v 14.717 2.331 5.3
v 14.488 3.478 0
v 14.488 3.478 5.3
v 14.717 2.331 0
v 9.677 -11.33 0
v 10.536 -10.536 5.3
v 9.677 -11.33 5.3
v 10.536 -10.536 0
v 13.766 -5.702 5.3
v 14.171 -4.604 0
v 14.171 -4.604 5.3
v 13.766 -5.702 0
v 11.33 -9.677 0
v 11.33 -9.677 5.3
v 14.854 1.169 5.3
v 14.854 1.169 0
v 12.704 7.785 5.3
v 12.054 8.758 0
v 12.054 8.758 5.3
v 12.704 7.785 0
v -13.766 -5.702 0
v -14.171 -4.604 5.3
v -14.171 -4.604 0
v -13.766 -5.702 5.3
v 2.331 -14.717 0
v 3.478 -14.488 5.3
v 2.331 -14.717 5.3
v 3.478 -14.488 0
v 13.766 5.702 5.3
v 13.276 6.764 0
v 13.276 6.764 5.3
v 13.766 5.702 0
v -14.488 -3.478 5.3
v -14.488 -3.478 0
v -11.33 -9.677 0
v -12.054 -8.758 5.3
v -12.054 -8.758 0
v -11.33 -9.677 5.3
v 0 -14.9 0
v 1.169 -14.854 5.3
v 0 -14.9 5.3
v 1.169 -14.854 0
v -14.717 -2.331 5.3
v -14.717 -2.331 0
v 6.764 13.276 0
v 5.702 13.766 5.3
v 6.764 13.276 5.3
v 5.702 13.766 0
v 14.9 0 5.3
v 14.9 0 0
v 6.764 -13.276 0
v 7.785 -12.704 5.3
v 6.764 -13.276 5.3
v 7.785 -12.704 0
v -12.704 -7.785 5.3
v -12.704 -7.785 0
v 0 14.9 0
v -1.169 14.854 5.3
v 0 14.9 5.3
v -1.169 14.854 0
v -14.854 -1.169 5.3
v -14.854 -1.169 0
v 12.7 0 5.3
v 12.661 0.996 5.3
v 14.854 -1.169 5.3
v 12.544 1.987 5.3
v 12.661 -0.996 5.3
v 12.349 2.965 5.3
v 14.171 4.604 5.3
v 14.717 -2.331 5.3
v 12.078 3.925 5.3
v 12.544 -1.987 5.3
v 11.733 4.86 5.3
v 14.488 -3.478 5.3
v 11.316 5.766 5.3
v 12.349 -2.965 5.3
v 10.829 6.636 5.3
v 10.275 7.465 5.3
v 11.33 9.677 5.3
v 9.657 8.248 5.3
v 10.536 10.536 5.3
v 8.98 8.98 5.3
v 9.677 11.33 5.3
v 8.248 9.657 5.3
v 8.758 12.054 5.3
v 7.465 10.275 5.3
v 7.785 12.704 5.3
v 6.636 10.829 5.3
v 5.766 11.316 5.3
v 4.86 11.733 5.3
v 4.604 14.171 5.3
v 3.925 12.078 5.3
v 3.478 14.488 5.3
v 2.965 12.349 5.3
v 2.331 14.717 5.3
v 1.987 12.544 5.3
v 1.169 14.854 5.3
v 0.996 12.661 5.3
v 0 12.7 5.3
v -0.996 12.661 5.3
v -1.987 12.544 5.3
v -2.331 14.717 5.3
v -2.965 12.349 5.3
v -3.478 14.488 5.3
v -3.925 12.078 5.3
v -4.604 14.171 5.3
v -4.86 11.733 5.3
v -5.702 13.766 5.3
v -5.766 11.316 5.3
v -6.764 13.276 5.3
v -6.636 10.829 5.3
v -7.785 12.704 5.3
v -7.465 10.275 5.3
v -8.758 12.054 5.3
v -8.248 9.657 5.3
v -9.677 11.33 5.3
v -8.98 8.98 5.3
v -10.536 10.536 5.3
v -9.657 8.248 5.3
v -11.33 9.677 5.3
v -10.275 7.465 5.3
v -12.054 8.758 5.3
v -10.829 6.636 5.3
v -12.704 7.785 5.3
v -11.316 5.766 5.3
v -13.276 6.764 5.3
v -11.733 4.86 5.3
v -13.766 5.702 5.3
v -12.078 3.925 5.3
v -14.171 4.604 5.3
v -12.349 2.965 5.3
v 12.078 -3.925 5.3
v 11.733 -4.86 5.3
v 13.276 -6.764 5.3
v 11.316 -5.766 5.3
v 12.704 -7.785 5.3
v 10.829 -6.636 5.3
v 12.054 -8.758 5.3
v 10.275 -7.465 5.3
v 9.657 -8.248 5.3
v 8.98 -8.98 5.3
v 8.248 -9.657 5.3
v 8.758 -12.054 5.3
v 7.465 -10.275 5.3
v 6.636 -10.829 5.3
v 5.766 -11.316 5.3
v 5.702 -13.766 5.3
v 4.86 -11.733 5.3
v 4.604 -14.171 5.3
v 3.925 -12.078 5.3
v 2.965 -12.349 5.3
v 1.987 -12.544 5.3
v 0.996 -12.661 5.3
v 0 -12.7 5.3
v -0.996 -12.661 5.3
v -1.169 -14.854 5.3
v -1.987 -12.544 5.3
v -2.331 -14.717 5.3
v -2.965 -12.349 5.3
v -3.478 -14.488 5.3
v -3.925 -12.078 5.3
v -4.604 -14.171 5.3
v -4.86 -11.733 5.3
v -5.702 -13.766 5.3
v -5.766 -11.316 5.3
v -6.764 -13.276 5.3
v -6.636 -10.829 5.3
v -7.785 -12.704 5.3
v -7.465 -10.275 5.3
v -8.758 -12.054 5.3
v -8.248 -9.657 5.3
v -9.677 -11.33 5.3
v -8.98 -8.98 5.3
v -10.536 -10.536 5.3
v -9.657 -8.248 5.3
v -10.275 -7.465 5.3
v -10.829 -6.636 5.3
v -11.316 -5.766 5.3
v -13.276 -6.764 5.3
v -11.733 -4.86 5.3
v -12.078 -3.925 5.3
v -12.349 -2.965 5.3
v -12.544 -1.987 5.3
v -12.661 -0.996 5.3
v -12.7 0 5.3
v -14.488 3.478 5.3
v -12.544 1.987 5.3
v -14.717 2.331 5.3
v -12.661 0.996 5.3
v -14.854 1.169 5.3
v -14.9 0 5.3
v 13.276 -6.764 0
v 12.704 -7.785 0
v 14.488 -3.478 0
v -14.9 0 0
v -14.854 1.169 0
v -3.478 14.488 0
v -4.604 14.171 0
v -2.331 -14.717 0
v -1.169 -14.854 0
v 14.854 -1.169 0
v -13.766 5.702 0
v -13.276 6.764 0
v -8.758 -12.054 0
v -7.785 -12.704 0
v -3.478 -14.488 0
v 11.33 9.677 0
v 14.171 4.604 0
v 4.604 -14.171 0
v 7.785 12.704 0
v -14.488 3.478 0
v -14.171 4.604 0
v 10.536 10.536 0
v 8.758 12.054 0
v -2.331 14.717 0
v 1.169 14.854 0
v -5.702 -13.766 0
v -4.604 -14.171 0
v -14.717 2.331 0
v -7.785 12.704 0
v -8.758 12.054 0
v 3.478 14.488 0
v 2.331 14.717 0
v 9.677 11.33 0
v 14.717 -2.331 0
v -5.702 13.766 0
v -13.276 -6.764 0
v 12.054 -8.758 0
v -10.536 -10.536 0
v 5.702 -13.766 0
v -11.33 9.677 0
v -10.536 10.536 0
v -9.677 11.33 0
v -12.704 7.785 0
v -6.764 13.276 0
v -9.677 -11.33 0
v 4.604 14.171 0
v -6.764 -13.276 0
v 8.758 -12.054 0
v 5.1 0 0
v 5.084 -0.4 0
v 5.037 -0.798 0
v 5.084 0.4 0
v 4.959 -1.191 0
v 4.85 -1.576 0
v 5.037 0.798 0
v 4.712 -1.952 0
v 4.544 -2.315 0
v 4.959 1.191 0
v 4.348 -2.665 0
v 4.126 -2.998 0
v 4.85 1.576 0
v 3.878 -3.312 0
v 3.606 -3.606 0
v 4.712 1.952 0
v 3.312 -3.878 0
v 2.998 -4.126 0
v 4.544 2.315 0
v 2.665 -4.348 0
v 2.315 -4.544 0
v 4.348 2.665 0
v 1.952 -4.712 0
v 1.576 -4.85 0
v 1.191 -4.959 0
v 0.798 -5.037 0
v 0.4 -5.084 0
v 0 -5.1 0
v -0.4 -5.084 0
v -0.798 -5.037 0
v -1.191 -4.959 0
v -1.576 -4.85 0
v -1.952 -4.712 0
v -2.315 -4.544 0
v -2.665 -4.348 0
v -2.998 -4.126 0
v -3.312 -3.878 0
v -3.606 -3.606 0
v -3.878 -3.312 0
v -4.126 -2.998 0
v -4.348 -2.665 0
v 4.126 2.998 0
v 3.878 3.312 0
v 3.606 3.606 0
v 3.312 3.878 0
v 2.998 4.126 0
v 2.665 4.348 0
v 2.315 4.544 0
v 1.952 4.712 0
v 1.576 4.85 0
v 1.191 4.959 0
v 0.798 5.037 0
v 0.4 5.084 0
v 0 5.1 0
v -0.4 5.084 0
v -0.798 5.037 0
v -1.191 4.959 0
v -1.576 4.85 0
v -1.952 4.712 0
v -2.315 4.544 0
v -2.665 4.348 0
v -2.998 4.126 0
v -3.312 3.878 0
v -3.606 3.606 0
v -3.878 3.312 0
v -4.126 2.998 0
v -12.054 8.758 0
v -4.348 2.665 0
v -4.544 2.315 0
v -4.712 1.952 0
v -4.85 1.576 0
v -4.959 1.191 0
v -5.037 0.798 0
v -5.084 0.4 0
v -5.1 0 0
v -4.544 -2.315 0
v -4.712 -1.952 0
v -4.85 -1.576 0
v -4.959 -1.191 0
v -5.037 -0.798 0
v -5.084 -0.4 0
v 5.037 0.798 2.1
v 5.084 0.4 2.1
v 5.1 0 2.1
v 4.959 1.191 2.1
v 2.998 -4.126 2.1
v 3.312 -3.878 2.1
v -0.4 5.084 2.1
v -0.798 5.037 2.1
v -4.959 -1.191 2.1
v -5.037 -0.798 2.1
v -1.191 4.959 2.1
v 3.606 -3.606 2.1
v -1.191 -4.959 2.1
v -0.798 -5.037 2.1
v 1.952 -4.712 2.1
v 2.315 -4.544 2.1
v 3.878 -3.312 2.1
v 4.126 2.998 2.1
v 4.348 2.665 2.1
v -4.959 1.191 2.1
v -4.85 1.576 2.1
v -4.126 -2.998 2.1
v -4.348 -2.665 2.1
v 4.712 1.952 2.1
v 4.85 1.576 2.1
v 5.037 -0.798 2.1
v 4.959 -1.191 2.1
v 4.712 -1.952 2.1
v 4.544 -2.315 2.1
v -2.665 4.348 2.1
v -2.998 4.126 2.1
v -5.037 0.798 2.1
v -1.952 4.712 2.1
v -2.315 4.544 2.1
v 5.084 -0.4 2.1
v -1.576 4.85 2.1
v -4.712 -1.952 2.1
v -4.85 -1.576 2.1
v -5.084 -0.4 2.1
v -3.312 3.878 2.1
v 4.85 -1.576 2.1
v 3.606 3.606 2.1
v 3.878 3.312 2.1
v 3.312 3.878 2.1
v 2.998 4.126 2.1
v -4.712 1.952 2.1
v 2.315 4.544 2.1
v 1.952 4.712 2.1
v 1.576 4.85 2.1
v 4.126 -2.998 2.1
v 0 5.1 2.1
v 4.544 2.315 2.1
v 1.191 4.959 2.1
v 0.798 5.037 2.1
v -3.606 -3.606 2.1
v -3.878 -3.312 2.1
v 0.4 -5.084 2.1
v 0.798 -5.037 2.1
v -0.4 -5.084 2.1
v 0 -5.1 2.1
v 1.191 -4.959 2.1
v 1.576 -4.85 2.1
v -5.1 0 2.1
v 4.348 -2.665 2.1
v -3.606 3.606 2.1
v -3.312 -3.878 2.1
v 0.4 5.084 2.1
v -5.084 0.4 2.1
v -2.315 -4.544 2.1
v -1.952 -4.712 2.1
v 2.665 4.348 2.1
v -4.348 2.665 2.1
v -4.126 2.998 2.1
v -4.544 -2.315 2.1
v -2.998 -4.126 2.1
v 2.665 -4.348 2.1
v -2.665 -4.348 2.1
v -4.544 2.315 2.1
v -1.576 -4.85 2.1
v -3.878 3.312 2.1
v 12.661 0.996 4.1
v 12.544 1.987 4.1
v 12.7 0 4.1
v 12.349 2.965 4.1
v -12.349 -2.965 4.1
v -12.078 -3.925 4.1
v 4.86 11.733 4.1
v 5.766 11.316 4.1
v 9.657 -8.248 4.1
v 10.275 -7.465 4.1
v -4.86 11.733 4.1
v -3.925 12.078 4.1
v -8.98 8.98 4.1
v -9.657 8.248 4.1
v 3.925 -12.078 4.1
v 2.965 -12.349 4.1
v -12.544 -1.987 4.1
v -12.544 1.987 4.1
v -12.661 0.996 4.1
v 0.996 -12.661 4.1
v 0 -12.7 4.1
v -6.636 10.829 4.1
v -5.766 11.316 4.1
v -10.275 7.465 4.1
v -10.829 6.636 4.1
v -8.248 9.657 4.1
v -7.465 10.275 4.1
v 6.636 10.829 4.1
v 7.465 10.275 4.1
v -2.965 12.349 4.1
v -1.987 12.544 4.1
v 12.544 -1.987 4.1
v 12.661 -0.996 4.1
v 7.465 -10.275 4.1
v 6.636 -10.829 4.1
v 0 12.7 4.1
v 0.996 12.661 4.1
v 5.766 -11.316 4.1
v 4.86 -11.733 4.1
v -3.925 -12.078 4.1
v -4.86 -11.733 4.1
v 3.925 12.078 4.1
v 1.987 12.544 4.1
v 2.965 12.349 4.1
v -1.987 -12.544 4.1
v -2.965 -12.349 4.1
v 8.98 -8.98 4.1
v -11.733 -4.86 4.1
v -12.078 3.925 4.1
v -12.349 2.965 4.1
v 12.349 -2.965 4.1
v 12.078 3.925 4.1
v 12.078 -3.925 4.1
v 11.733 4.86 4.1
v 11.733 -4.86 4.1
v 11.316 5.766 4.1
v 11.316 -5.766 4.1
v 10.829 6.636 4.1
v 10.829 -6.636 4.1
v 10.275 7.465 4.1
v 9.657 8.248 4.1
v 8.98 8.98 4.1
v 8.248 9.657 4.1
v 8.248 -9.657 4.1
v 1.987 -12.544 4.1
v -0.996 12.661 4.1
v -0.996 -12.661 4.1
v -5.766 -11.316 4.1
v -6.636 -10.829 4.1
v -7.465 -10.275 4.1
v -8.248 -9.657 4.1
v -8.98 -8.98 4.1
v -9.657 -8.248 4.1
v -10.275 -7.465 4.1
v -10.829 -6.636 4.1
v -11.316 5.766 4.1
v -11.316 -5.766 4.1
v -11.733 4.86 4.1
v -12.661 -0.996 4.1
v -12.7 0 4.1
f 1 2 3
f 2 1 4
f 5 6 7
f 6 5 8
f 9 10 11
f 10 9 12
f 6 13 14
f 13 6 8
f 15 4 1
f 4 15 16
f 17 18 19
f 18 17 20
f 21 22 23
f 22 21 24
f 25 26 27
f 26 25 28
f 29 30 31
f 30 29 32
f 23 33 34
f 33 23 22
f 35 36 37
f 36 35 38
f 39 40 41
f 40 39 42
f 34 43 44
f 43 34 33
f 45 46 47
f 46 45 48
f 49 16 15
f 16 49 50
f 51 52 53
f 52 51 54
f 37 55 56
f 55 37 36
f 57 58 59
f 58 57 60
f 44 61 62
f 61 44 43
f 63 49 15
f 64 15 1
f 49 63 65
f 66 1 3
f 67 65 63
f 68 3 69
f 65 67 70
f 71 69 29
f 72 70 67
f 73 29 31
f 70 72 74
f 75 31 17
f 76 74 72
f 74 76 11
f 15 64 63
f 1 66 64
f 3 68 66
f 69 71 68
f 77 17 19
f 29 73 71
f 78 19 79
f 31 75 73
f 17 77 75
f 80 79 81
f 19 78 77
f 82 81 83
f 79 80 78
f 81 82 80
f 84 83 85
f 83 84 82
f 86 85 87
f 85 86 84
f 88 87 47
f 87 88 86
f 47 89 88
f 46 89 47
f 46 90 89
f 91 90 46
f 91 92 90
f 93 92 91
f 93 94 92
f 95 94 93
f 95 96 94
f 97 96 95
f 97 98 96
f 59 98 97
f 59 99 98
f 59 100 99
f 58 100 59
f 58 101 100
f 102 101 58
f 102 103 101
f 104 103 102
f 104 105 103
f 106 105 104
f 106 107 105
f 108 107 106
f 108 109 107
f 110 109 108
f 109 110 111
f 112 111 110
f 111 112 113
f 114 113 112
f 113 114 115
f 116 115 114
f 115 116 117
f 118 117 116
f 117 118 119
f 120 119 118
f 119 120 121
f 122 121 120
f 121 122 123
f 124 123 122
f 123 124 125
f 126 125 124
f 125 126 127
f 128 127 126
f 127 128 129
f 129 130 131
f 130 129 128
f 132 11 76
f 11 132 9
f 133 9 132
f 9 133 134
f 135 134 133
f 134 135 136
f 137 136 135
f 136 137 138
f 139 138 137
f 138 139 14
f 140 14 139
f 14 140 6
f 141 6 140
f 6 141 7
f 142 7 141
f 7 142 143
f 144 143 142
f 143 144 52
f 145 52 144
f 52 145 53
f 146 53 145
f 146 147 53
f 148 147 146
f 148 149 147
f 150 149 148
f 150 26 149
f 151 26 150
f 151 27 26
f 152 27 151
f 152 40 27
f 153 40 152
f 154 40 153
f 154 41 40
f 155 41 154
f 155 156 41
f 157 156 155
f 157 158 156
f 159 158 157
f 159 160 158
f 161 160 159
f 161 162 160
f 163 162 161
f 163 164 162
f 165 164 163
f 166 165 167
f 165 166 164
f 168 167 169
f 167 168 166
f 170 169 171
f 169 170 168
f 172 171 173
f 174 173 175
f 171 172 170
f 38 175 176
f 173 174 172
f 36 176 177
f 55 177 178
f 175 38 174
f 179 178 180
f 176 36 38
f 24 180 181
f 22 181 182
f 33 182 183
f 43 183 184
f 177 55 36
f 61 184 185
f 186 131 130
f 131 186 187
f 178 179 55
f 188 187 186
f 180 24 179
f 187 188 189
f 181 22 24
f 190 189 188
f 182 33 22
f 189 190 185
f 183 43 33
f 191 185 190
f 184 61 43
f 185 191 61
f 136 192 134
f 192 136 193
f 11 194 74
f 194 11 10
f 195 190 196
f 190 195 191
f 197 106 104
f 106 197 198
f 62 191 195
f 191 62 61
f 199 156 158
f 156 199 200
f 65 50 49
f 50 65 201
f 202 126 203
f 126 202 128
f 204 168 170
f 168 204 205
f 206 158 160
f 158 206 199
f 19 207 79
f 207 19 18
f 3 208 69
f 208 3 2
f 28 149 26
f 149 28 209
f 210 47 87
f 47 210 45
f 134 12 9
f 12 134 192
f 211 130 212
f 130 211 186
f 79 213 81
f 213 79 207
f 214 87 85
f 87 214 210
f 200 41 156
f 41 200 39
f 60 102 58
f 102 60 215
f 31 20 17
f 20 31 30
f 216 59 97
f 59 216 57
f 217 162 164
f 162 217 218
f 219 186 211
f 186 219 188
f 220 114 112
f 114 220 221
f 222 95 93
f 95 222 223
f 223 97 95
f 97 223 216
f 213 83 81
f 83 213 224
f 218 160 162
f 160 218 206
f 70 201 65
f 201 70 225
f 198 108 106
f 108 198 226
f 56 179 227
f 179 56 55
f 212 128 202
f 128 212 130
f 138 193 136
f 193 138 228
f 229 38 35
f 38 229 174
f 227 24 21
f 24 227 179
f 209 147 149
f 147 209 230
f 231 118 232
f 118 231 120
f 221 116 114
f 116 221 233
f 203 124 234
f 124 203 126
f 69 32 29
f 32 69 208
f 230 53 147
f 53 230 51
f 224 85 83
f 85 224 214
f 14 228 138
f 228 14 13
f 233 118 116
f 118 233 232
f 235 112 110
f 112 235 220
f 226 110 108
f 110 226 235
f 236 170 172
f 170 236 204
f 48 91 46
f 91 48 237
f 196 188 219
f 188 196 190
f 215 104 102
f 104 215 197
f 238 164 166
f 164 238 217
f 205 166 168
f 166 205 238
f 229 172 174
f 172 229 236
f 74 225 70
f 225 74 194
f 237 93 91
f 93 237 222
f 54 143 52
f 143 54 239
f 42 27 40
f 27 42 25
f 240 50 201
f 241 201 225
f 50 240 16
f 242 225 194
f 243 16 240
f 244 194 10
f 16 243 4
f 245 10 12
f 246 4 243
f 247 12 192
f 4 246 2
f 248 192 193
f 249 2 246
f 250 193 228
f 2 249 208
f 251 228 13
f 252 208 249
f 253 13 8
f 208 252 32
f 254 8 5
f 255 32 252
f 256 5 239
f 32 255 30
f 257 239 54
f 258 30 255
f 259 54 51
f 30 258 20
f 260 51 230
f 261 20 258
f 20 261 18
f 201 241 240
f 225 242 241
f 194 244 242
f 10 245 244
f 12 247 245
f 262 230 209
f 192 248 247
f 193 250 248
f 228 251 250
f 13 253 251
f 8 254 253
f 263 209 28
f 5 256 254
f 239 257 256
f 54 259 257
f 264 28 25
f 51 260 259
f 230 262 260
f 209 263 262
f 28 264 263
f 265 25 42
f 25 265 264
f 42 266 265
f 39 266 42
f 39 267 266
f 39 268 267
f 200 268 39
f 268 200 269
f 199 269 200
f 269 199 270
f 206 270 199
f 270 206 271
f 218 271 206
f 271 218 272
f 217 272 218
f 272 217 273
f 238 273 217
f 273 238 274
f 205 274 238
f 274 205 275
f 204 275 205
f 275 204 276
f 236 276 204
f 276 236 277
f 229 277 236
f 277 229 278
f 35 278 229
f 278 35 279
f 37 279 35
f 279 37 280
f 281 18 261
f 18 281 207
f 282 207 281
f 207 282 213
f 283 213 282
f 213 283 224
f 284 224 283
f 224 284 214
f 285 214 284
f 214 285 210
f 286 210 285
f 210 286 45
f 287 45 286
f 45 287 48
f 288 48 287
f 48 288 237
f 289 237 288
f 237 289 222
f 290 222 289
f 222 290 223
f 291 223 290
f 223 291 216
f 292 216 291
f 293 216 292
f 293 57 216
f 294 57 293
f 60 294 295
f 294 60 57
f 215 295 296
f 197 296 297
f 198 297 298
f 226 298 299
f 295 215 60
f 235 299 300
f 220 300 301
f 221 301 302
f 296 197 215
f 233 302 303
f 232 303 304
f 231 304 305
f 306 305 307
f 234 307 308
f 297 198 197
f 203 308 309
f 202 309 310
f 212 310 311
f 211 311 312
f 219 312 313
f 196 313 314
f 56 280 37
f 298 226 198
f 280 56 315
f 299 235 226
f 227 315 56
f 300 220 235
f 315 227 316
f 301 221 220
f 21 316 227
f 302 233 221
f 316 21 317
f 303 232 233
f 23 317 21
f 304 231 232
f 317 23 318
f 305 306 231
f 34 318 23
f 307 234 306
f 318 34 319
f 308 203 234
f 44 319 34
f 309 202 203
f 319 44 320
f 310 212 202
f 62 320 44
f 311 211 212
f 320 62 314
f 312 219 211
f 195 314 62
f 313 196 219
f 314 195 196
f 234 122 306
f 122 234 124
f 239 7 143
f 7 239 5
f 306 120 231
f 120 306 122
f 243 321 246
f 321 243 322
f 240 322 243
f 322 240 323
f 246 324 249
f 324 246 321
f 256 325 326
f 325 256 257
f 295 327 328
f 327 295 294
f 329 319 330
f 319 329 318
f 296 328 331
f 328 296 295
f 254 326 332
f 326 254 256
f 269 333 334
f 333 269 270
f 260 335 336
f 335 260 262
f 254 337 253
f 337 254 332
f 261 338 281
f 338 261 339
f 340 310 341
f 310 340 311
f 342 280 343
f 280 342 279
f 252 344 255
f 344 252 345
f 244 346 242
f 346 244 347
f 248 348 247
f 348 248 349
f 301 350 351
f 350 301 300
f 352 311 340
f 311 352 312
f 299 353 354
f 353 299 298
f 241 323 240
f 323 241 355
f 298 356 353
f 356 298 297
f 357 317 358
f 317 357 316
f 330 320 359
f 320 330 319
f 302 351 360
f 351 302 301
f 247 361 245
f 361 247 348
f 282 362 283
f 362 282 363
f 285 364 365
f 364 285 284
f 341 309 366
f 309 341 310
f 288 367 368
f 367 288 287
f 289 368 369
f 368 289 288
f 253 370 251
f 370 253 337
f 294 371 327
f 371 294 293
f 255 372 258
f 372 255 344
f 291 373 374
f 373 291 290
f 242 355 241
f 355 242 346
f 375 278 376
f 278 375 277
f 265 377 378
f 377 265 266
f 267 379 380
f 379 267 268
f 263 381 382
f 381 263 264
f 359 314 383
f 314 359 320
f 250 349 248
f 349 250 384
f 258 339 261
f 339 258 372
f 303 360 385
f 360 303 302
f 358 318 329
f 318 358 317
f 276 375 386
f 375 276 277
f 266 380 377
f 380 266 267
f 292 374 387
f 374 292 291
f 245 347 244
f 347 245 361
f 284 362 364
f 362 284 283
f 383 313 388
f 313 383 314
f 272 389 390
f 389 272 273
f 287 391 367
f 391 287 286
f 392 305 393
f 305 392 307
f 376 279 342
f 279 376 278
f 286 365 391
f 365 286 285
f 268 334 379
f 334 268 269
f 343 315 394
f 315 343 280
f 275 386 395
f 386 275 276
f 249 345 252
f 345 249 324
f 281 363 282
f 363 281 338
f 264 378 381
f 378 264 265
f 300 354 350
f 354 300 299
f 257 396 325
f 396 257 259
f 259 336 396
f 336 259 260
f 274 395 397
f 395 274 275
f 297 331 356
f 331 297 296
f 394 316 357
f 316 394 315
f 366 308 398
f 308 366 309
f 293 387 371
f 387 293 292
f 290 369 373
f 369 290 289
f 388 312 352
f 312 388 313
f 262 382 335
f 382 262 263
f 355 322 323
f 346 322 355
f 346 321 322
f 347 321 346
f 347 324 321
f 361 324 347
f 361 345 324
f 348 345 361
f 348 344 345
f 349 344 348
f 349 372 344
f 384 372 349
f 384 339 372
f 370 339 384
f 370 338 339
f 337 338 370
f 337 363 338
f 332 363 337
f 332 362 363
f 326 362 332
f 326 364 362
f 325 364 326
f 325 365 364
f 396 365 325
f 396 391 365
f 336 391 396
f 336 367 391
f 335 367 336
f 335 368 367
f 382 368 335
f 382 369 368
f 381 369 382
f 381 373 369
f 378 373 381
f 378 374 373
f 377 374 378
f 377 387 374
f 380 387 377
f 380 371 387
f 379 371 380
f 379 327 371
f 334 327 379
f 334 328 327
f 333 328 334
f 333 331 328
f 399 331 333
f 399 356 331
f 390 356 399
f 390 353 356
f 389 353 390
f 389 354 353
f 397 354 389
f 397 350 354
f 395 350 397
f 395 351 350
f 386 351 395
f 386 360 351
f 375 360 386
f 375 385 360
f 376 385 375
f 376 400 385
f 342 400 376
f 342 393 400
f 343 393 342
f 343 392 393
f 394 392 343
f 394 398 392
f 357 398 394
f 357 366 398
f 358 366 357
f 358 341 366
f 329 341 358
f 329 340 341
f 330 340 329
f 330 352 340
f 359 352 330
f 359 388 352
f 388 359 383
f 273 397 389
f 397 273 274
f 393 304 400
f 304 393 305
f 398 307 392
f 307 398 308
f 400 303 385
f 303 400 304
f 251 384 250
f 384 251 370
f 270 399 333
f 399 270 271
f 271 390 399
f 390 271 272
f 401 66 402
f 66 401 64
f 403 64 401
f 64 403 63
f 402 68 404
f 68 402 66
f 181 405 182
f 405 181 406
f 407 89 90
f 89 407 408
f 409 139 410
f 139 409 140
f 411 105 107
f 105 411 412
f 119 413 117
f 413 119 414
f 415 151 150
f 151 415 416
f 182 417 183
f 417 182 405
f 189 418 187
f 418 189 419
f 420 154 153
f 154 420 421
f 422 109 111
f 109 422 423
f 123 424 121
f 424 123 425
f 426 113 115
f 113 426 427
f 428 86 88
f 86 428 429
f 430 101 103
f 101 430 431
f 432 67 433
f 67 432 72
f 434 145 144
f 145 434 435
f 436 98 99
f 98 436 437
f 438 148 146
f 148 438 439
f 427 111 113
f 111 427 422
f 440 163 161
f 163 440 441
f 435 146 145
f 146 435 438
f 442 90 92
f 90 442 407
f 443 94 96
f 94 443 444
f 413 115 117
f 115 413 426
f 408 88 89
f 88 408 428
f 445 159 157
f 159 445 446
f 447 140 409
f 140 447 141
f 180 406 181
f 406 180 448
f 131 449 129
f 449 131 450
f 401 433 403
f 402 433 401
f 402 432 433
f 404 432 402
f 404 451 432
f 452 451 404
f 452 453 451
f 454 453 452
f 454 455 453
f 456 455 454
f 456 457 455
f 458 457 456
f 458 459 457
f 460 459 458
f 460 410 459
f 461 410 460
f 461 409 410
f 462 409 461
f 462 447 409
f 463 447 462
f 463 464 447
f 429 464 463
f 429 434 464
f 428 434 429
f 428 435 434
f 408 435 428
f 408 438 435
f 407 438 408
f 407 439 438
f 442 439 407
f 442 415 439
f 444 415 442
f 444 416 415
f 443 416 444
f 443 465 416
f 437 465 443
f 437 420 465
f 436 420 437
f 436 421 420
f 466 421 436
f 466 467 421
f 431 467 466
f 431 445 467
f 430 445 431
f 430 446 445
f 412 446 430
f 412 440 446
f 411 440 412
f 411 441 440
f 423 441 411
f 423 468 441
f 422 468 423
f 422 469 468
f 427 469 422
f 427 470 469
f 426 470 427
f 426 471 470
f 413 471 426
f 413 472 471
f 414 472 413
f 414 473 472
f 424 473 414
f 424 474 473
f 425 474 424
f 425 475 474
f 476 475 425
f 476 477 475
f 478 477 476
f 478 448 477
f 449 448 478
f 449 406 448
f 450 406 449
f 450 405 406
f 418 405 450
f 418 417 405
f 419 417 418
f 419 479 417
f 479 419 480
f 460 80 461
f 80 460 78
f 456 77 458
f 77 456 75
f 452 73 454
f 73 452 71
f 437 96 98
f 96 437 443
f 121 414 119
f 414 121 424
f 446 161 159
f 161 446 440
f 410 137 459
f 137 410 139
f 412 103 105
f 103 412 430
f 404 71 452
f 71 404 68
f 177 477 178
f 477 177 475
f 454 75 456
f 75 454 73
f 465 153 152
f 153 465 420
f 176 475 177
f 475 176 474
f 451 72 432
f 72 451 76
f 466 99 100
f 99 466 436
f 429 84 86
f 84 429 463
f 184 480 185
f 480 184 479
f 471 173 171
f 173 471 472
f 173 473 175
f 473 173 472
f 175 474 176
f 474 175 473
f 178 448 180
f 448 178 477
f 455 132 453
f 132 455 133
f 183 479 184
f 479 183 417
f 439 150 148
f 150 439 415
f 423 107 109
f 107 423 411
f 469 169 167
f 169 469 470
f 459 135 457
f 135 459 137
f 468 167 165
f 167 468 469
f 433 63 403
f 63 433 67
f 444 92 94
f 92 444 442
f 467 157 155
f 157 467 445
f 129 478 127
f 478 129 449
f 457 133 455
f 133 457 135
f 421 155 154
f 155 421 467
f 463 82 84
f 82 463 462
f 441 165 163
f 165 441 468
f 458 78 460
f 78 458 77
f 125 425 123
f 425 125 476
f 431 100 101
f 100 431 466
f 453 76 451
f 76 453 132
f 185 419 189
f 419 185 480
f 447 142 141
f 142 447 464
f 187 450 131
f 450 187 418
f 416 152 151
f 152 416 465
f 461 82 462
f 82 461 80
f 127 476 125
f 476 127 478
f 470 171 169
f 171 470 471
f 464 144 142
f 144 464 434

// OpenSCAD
// Open Blocker key case
// 25 mm NTAG213 sticker on top, optional 10x2 mm magnet on the bottom.
// Print flat on the bed. No supports.

tag_d = 25.4;
tag_h = 1.2;
magnet_d = 10.2;
magnet_h = 2.1;
wall = 2.2;
floor_gap = 1.2;
$fn = 80;

outer_d = tag_d + wall * 2;
height = magnet_h + floor_gap + tag_h + 0.8;

difference() {
    cylinder(d = outer_d, h = height);
    // Magnet pocket opens on the bed (z=0), no supports
    translate([0, 0, -0.1])
        cylinder(d = magnet_d, h = magnet_h + 0.1);
    // Tag well opens on the top face
    translate([0, 0, height - tag_h])
        cylinder(d = tag_d, h = tag_h + 0.2);
}
